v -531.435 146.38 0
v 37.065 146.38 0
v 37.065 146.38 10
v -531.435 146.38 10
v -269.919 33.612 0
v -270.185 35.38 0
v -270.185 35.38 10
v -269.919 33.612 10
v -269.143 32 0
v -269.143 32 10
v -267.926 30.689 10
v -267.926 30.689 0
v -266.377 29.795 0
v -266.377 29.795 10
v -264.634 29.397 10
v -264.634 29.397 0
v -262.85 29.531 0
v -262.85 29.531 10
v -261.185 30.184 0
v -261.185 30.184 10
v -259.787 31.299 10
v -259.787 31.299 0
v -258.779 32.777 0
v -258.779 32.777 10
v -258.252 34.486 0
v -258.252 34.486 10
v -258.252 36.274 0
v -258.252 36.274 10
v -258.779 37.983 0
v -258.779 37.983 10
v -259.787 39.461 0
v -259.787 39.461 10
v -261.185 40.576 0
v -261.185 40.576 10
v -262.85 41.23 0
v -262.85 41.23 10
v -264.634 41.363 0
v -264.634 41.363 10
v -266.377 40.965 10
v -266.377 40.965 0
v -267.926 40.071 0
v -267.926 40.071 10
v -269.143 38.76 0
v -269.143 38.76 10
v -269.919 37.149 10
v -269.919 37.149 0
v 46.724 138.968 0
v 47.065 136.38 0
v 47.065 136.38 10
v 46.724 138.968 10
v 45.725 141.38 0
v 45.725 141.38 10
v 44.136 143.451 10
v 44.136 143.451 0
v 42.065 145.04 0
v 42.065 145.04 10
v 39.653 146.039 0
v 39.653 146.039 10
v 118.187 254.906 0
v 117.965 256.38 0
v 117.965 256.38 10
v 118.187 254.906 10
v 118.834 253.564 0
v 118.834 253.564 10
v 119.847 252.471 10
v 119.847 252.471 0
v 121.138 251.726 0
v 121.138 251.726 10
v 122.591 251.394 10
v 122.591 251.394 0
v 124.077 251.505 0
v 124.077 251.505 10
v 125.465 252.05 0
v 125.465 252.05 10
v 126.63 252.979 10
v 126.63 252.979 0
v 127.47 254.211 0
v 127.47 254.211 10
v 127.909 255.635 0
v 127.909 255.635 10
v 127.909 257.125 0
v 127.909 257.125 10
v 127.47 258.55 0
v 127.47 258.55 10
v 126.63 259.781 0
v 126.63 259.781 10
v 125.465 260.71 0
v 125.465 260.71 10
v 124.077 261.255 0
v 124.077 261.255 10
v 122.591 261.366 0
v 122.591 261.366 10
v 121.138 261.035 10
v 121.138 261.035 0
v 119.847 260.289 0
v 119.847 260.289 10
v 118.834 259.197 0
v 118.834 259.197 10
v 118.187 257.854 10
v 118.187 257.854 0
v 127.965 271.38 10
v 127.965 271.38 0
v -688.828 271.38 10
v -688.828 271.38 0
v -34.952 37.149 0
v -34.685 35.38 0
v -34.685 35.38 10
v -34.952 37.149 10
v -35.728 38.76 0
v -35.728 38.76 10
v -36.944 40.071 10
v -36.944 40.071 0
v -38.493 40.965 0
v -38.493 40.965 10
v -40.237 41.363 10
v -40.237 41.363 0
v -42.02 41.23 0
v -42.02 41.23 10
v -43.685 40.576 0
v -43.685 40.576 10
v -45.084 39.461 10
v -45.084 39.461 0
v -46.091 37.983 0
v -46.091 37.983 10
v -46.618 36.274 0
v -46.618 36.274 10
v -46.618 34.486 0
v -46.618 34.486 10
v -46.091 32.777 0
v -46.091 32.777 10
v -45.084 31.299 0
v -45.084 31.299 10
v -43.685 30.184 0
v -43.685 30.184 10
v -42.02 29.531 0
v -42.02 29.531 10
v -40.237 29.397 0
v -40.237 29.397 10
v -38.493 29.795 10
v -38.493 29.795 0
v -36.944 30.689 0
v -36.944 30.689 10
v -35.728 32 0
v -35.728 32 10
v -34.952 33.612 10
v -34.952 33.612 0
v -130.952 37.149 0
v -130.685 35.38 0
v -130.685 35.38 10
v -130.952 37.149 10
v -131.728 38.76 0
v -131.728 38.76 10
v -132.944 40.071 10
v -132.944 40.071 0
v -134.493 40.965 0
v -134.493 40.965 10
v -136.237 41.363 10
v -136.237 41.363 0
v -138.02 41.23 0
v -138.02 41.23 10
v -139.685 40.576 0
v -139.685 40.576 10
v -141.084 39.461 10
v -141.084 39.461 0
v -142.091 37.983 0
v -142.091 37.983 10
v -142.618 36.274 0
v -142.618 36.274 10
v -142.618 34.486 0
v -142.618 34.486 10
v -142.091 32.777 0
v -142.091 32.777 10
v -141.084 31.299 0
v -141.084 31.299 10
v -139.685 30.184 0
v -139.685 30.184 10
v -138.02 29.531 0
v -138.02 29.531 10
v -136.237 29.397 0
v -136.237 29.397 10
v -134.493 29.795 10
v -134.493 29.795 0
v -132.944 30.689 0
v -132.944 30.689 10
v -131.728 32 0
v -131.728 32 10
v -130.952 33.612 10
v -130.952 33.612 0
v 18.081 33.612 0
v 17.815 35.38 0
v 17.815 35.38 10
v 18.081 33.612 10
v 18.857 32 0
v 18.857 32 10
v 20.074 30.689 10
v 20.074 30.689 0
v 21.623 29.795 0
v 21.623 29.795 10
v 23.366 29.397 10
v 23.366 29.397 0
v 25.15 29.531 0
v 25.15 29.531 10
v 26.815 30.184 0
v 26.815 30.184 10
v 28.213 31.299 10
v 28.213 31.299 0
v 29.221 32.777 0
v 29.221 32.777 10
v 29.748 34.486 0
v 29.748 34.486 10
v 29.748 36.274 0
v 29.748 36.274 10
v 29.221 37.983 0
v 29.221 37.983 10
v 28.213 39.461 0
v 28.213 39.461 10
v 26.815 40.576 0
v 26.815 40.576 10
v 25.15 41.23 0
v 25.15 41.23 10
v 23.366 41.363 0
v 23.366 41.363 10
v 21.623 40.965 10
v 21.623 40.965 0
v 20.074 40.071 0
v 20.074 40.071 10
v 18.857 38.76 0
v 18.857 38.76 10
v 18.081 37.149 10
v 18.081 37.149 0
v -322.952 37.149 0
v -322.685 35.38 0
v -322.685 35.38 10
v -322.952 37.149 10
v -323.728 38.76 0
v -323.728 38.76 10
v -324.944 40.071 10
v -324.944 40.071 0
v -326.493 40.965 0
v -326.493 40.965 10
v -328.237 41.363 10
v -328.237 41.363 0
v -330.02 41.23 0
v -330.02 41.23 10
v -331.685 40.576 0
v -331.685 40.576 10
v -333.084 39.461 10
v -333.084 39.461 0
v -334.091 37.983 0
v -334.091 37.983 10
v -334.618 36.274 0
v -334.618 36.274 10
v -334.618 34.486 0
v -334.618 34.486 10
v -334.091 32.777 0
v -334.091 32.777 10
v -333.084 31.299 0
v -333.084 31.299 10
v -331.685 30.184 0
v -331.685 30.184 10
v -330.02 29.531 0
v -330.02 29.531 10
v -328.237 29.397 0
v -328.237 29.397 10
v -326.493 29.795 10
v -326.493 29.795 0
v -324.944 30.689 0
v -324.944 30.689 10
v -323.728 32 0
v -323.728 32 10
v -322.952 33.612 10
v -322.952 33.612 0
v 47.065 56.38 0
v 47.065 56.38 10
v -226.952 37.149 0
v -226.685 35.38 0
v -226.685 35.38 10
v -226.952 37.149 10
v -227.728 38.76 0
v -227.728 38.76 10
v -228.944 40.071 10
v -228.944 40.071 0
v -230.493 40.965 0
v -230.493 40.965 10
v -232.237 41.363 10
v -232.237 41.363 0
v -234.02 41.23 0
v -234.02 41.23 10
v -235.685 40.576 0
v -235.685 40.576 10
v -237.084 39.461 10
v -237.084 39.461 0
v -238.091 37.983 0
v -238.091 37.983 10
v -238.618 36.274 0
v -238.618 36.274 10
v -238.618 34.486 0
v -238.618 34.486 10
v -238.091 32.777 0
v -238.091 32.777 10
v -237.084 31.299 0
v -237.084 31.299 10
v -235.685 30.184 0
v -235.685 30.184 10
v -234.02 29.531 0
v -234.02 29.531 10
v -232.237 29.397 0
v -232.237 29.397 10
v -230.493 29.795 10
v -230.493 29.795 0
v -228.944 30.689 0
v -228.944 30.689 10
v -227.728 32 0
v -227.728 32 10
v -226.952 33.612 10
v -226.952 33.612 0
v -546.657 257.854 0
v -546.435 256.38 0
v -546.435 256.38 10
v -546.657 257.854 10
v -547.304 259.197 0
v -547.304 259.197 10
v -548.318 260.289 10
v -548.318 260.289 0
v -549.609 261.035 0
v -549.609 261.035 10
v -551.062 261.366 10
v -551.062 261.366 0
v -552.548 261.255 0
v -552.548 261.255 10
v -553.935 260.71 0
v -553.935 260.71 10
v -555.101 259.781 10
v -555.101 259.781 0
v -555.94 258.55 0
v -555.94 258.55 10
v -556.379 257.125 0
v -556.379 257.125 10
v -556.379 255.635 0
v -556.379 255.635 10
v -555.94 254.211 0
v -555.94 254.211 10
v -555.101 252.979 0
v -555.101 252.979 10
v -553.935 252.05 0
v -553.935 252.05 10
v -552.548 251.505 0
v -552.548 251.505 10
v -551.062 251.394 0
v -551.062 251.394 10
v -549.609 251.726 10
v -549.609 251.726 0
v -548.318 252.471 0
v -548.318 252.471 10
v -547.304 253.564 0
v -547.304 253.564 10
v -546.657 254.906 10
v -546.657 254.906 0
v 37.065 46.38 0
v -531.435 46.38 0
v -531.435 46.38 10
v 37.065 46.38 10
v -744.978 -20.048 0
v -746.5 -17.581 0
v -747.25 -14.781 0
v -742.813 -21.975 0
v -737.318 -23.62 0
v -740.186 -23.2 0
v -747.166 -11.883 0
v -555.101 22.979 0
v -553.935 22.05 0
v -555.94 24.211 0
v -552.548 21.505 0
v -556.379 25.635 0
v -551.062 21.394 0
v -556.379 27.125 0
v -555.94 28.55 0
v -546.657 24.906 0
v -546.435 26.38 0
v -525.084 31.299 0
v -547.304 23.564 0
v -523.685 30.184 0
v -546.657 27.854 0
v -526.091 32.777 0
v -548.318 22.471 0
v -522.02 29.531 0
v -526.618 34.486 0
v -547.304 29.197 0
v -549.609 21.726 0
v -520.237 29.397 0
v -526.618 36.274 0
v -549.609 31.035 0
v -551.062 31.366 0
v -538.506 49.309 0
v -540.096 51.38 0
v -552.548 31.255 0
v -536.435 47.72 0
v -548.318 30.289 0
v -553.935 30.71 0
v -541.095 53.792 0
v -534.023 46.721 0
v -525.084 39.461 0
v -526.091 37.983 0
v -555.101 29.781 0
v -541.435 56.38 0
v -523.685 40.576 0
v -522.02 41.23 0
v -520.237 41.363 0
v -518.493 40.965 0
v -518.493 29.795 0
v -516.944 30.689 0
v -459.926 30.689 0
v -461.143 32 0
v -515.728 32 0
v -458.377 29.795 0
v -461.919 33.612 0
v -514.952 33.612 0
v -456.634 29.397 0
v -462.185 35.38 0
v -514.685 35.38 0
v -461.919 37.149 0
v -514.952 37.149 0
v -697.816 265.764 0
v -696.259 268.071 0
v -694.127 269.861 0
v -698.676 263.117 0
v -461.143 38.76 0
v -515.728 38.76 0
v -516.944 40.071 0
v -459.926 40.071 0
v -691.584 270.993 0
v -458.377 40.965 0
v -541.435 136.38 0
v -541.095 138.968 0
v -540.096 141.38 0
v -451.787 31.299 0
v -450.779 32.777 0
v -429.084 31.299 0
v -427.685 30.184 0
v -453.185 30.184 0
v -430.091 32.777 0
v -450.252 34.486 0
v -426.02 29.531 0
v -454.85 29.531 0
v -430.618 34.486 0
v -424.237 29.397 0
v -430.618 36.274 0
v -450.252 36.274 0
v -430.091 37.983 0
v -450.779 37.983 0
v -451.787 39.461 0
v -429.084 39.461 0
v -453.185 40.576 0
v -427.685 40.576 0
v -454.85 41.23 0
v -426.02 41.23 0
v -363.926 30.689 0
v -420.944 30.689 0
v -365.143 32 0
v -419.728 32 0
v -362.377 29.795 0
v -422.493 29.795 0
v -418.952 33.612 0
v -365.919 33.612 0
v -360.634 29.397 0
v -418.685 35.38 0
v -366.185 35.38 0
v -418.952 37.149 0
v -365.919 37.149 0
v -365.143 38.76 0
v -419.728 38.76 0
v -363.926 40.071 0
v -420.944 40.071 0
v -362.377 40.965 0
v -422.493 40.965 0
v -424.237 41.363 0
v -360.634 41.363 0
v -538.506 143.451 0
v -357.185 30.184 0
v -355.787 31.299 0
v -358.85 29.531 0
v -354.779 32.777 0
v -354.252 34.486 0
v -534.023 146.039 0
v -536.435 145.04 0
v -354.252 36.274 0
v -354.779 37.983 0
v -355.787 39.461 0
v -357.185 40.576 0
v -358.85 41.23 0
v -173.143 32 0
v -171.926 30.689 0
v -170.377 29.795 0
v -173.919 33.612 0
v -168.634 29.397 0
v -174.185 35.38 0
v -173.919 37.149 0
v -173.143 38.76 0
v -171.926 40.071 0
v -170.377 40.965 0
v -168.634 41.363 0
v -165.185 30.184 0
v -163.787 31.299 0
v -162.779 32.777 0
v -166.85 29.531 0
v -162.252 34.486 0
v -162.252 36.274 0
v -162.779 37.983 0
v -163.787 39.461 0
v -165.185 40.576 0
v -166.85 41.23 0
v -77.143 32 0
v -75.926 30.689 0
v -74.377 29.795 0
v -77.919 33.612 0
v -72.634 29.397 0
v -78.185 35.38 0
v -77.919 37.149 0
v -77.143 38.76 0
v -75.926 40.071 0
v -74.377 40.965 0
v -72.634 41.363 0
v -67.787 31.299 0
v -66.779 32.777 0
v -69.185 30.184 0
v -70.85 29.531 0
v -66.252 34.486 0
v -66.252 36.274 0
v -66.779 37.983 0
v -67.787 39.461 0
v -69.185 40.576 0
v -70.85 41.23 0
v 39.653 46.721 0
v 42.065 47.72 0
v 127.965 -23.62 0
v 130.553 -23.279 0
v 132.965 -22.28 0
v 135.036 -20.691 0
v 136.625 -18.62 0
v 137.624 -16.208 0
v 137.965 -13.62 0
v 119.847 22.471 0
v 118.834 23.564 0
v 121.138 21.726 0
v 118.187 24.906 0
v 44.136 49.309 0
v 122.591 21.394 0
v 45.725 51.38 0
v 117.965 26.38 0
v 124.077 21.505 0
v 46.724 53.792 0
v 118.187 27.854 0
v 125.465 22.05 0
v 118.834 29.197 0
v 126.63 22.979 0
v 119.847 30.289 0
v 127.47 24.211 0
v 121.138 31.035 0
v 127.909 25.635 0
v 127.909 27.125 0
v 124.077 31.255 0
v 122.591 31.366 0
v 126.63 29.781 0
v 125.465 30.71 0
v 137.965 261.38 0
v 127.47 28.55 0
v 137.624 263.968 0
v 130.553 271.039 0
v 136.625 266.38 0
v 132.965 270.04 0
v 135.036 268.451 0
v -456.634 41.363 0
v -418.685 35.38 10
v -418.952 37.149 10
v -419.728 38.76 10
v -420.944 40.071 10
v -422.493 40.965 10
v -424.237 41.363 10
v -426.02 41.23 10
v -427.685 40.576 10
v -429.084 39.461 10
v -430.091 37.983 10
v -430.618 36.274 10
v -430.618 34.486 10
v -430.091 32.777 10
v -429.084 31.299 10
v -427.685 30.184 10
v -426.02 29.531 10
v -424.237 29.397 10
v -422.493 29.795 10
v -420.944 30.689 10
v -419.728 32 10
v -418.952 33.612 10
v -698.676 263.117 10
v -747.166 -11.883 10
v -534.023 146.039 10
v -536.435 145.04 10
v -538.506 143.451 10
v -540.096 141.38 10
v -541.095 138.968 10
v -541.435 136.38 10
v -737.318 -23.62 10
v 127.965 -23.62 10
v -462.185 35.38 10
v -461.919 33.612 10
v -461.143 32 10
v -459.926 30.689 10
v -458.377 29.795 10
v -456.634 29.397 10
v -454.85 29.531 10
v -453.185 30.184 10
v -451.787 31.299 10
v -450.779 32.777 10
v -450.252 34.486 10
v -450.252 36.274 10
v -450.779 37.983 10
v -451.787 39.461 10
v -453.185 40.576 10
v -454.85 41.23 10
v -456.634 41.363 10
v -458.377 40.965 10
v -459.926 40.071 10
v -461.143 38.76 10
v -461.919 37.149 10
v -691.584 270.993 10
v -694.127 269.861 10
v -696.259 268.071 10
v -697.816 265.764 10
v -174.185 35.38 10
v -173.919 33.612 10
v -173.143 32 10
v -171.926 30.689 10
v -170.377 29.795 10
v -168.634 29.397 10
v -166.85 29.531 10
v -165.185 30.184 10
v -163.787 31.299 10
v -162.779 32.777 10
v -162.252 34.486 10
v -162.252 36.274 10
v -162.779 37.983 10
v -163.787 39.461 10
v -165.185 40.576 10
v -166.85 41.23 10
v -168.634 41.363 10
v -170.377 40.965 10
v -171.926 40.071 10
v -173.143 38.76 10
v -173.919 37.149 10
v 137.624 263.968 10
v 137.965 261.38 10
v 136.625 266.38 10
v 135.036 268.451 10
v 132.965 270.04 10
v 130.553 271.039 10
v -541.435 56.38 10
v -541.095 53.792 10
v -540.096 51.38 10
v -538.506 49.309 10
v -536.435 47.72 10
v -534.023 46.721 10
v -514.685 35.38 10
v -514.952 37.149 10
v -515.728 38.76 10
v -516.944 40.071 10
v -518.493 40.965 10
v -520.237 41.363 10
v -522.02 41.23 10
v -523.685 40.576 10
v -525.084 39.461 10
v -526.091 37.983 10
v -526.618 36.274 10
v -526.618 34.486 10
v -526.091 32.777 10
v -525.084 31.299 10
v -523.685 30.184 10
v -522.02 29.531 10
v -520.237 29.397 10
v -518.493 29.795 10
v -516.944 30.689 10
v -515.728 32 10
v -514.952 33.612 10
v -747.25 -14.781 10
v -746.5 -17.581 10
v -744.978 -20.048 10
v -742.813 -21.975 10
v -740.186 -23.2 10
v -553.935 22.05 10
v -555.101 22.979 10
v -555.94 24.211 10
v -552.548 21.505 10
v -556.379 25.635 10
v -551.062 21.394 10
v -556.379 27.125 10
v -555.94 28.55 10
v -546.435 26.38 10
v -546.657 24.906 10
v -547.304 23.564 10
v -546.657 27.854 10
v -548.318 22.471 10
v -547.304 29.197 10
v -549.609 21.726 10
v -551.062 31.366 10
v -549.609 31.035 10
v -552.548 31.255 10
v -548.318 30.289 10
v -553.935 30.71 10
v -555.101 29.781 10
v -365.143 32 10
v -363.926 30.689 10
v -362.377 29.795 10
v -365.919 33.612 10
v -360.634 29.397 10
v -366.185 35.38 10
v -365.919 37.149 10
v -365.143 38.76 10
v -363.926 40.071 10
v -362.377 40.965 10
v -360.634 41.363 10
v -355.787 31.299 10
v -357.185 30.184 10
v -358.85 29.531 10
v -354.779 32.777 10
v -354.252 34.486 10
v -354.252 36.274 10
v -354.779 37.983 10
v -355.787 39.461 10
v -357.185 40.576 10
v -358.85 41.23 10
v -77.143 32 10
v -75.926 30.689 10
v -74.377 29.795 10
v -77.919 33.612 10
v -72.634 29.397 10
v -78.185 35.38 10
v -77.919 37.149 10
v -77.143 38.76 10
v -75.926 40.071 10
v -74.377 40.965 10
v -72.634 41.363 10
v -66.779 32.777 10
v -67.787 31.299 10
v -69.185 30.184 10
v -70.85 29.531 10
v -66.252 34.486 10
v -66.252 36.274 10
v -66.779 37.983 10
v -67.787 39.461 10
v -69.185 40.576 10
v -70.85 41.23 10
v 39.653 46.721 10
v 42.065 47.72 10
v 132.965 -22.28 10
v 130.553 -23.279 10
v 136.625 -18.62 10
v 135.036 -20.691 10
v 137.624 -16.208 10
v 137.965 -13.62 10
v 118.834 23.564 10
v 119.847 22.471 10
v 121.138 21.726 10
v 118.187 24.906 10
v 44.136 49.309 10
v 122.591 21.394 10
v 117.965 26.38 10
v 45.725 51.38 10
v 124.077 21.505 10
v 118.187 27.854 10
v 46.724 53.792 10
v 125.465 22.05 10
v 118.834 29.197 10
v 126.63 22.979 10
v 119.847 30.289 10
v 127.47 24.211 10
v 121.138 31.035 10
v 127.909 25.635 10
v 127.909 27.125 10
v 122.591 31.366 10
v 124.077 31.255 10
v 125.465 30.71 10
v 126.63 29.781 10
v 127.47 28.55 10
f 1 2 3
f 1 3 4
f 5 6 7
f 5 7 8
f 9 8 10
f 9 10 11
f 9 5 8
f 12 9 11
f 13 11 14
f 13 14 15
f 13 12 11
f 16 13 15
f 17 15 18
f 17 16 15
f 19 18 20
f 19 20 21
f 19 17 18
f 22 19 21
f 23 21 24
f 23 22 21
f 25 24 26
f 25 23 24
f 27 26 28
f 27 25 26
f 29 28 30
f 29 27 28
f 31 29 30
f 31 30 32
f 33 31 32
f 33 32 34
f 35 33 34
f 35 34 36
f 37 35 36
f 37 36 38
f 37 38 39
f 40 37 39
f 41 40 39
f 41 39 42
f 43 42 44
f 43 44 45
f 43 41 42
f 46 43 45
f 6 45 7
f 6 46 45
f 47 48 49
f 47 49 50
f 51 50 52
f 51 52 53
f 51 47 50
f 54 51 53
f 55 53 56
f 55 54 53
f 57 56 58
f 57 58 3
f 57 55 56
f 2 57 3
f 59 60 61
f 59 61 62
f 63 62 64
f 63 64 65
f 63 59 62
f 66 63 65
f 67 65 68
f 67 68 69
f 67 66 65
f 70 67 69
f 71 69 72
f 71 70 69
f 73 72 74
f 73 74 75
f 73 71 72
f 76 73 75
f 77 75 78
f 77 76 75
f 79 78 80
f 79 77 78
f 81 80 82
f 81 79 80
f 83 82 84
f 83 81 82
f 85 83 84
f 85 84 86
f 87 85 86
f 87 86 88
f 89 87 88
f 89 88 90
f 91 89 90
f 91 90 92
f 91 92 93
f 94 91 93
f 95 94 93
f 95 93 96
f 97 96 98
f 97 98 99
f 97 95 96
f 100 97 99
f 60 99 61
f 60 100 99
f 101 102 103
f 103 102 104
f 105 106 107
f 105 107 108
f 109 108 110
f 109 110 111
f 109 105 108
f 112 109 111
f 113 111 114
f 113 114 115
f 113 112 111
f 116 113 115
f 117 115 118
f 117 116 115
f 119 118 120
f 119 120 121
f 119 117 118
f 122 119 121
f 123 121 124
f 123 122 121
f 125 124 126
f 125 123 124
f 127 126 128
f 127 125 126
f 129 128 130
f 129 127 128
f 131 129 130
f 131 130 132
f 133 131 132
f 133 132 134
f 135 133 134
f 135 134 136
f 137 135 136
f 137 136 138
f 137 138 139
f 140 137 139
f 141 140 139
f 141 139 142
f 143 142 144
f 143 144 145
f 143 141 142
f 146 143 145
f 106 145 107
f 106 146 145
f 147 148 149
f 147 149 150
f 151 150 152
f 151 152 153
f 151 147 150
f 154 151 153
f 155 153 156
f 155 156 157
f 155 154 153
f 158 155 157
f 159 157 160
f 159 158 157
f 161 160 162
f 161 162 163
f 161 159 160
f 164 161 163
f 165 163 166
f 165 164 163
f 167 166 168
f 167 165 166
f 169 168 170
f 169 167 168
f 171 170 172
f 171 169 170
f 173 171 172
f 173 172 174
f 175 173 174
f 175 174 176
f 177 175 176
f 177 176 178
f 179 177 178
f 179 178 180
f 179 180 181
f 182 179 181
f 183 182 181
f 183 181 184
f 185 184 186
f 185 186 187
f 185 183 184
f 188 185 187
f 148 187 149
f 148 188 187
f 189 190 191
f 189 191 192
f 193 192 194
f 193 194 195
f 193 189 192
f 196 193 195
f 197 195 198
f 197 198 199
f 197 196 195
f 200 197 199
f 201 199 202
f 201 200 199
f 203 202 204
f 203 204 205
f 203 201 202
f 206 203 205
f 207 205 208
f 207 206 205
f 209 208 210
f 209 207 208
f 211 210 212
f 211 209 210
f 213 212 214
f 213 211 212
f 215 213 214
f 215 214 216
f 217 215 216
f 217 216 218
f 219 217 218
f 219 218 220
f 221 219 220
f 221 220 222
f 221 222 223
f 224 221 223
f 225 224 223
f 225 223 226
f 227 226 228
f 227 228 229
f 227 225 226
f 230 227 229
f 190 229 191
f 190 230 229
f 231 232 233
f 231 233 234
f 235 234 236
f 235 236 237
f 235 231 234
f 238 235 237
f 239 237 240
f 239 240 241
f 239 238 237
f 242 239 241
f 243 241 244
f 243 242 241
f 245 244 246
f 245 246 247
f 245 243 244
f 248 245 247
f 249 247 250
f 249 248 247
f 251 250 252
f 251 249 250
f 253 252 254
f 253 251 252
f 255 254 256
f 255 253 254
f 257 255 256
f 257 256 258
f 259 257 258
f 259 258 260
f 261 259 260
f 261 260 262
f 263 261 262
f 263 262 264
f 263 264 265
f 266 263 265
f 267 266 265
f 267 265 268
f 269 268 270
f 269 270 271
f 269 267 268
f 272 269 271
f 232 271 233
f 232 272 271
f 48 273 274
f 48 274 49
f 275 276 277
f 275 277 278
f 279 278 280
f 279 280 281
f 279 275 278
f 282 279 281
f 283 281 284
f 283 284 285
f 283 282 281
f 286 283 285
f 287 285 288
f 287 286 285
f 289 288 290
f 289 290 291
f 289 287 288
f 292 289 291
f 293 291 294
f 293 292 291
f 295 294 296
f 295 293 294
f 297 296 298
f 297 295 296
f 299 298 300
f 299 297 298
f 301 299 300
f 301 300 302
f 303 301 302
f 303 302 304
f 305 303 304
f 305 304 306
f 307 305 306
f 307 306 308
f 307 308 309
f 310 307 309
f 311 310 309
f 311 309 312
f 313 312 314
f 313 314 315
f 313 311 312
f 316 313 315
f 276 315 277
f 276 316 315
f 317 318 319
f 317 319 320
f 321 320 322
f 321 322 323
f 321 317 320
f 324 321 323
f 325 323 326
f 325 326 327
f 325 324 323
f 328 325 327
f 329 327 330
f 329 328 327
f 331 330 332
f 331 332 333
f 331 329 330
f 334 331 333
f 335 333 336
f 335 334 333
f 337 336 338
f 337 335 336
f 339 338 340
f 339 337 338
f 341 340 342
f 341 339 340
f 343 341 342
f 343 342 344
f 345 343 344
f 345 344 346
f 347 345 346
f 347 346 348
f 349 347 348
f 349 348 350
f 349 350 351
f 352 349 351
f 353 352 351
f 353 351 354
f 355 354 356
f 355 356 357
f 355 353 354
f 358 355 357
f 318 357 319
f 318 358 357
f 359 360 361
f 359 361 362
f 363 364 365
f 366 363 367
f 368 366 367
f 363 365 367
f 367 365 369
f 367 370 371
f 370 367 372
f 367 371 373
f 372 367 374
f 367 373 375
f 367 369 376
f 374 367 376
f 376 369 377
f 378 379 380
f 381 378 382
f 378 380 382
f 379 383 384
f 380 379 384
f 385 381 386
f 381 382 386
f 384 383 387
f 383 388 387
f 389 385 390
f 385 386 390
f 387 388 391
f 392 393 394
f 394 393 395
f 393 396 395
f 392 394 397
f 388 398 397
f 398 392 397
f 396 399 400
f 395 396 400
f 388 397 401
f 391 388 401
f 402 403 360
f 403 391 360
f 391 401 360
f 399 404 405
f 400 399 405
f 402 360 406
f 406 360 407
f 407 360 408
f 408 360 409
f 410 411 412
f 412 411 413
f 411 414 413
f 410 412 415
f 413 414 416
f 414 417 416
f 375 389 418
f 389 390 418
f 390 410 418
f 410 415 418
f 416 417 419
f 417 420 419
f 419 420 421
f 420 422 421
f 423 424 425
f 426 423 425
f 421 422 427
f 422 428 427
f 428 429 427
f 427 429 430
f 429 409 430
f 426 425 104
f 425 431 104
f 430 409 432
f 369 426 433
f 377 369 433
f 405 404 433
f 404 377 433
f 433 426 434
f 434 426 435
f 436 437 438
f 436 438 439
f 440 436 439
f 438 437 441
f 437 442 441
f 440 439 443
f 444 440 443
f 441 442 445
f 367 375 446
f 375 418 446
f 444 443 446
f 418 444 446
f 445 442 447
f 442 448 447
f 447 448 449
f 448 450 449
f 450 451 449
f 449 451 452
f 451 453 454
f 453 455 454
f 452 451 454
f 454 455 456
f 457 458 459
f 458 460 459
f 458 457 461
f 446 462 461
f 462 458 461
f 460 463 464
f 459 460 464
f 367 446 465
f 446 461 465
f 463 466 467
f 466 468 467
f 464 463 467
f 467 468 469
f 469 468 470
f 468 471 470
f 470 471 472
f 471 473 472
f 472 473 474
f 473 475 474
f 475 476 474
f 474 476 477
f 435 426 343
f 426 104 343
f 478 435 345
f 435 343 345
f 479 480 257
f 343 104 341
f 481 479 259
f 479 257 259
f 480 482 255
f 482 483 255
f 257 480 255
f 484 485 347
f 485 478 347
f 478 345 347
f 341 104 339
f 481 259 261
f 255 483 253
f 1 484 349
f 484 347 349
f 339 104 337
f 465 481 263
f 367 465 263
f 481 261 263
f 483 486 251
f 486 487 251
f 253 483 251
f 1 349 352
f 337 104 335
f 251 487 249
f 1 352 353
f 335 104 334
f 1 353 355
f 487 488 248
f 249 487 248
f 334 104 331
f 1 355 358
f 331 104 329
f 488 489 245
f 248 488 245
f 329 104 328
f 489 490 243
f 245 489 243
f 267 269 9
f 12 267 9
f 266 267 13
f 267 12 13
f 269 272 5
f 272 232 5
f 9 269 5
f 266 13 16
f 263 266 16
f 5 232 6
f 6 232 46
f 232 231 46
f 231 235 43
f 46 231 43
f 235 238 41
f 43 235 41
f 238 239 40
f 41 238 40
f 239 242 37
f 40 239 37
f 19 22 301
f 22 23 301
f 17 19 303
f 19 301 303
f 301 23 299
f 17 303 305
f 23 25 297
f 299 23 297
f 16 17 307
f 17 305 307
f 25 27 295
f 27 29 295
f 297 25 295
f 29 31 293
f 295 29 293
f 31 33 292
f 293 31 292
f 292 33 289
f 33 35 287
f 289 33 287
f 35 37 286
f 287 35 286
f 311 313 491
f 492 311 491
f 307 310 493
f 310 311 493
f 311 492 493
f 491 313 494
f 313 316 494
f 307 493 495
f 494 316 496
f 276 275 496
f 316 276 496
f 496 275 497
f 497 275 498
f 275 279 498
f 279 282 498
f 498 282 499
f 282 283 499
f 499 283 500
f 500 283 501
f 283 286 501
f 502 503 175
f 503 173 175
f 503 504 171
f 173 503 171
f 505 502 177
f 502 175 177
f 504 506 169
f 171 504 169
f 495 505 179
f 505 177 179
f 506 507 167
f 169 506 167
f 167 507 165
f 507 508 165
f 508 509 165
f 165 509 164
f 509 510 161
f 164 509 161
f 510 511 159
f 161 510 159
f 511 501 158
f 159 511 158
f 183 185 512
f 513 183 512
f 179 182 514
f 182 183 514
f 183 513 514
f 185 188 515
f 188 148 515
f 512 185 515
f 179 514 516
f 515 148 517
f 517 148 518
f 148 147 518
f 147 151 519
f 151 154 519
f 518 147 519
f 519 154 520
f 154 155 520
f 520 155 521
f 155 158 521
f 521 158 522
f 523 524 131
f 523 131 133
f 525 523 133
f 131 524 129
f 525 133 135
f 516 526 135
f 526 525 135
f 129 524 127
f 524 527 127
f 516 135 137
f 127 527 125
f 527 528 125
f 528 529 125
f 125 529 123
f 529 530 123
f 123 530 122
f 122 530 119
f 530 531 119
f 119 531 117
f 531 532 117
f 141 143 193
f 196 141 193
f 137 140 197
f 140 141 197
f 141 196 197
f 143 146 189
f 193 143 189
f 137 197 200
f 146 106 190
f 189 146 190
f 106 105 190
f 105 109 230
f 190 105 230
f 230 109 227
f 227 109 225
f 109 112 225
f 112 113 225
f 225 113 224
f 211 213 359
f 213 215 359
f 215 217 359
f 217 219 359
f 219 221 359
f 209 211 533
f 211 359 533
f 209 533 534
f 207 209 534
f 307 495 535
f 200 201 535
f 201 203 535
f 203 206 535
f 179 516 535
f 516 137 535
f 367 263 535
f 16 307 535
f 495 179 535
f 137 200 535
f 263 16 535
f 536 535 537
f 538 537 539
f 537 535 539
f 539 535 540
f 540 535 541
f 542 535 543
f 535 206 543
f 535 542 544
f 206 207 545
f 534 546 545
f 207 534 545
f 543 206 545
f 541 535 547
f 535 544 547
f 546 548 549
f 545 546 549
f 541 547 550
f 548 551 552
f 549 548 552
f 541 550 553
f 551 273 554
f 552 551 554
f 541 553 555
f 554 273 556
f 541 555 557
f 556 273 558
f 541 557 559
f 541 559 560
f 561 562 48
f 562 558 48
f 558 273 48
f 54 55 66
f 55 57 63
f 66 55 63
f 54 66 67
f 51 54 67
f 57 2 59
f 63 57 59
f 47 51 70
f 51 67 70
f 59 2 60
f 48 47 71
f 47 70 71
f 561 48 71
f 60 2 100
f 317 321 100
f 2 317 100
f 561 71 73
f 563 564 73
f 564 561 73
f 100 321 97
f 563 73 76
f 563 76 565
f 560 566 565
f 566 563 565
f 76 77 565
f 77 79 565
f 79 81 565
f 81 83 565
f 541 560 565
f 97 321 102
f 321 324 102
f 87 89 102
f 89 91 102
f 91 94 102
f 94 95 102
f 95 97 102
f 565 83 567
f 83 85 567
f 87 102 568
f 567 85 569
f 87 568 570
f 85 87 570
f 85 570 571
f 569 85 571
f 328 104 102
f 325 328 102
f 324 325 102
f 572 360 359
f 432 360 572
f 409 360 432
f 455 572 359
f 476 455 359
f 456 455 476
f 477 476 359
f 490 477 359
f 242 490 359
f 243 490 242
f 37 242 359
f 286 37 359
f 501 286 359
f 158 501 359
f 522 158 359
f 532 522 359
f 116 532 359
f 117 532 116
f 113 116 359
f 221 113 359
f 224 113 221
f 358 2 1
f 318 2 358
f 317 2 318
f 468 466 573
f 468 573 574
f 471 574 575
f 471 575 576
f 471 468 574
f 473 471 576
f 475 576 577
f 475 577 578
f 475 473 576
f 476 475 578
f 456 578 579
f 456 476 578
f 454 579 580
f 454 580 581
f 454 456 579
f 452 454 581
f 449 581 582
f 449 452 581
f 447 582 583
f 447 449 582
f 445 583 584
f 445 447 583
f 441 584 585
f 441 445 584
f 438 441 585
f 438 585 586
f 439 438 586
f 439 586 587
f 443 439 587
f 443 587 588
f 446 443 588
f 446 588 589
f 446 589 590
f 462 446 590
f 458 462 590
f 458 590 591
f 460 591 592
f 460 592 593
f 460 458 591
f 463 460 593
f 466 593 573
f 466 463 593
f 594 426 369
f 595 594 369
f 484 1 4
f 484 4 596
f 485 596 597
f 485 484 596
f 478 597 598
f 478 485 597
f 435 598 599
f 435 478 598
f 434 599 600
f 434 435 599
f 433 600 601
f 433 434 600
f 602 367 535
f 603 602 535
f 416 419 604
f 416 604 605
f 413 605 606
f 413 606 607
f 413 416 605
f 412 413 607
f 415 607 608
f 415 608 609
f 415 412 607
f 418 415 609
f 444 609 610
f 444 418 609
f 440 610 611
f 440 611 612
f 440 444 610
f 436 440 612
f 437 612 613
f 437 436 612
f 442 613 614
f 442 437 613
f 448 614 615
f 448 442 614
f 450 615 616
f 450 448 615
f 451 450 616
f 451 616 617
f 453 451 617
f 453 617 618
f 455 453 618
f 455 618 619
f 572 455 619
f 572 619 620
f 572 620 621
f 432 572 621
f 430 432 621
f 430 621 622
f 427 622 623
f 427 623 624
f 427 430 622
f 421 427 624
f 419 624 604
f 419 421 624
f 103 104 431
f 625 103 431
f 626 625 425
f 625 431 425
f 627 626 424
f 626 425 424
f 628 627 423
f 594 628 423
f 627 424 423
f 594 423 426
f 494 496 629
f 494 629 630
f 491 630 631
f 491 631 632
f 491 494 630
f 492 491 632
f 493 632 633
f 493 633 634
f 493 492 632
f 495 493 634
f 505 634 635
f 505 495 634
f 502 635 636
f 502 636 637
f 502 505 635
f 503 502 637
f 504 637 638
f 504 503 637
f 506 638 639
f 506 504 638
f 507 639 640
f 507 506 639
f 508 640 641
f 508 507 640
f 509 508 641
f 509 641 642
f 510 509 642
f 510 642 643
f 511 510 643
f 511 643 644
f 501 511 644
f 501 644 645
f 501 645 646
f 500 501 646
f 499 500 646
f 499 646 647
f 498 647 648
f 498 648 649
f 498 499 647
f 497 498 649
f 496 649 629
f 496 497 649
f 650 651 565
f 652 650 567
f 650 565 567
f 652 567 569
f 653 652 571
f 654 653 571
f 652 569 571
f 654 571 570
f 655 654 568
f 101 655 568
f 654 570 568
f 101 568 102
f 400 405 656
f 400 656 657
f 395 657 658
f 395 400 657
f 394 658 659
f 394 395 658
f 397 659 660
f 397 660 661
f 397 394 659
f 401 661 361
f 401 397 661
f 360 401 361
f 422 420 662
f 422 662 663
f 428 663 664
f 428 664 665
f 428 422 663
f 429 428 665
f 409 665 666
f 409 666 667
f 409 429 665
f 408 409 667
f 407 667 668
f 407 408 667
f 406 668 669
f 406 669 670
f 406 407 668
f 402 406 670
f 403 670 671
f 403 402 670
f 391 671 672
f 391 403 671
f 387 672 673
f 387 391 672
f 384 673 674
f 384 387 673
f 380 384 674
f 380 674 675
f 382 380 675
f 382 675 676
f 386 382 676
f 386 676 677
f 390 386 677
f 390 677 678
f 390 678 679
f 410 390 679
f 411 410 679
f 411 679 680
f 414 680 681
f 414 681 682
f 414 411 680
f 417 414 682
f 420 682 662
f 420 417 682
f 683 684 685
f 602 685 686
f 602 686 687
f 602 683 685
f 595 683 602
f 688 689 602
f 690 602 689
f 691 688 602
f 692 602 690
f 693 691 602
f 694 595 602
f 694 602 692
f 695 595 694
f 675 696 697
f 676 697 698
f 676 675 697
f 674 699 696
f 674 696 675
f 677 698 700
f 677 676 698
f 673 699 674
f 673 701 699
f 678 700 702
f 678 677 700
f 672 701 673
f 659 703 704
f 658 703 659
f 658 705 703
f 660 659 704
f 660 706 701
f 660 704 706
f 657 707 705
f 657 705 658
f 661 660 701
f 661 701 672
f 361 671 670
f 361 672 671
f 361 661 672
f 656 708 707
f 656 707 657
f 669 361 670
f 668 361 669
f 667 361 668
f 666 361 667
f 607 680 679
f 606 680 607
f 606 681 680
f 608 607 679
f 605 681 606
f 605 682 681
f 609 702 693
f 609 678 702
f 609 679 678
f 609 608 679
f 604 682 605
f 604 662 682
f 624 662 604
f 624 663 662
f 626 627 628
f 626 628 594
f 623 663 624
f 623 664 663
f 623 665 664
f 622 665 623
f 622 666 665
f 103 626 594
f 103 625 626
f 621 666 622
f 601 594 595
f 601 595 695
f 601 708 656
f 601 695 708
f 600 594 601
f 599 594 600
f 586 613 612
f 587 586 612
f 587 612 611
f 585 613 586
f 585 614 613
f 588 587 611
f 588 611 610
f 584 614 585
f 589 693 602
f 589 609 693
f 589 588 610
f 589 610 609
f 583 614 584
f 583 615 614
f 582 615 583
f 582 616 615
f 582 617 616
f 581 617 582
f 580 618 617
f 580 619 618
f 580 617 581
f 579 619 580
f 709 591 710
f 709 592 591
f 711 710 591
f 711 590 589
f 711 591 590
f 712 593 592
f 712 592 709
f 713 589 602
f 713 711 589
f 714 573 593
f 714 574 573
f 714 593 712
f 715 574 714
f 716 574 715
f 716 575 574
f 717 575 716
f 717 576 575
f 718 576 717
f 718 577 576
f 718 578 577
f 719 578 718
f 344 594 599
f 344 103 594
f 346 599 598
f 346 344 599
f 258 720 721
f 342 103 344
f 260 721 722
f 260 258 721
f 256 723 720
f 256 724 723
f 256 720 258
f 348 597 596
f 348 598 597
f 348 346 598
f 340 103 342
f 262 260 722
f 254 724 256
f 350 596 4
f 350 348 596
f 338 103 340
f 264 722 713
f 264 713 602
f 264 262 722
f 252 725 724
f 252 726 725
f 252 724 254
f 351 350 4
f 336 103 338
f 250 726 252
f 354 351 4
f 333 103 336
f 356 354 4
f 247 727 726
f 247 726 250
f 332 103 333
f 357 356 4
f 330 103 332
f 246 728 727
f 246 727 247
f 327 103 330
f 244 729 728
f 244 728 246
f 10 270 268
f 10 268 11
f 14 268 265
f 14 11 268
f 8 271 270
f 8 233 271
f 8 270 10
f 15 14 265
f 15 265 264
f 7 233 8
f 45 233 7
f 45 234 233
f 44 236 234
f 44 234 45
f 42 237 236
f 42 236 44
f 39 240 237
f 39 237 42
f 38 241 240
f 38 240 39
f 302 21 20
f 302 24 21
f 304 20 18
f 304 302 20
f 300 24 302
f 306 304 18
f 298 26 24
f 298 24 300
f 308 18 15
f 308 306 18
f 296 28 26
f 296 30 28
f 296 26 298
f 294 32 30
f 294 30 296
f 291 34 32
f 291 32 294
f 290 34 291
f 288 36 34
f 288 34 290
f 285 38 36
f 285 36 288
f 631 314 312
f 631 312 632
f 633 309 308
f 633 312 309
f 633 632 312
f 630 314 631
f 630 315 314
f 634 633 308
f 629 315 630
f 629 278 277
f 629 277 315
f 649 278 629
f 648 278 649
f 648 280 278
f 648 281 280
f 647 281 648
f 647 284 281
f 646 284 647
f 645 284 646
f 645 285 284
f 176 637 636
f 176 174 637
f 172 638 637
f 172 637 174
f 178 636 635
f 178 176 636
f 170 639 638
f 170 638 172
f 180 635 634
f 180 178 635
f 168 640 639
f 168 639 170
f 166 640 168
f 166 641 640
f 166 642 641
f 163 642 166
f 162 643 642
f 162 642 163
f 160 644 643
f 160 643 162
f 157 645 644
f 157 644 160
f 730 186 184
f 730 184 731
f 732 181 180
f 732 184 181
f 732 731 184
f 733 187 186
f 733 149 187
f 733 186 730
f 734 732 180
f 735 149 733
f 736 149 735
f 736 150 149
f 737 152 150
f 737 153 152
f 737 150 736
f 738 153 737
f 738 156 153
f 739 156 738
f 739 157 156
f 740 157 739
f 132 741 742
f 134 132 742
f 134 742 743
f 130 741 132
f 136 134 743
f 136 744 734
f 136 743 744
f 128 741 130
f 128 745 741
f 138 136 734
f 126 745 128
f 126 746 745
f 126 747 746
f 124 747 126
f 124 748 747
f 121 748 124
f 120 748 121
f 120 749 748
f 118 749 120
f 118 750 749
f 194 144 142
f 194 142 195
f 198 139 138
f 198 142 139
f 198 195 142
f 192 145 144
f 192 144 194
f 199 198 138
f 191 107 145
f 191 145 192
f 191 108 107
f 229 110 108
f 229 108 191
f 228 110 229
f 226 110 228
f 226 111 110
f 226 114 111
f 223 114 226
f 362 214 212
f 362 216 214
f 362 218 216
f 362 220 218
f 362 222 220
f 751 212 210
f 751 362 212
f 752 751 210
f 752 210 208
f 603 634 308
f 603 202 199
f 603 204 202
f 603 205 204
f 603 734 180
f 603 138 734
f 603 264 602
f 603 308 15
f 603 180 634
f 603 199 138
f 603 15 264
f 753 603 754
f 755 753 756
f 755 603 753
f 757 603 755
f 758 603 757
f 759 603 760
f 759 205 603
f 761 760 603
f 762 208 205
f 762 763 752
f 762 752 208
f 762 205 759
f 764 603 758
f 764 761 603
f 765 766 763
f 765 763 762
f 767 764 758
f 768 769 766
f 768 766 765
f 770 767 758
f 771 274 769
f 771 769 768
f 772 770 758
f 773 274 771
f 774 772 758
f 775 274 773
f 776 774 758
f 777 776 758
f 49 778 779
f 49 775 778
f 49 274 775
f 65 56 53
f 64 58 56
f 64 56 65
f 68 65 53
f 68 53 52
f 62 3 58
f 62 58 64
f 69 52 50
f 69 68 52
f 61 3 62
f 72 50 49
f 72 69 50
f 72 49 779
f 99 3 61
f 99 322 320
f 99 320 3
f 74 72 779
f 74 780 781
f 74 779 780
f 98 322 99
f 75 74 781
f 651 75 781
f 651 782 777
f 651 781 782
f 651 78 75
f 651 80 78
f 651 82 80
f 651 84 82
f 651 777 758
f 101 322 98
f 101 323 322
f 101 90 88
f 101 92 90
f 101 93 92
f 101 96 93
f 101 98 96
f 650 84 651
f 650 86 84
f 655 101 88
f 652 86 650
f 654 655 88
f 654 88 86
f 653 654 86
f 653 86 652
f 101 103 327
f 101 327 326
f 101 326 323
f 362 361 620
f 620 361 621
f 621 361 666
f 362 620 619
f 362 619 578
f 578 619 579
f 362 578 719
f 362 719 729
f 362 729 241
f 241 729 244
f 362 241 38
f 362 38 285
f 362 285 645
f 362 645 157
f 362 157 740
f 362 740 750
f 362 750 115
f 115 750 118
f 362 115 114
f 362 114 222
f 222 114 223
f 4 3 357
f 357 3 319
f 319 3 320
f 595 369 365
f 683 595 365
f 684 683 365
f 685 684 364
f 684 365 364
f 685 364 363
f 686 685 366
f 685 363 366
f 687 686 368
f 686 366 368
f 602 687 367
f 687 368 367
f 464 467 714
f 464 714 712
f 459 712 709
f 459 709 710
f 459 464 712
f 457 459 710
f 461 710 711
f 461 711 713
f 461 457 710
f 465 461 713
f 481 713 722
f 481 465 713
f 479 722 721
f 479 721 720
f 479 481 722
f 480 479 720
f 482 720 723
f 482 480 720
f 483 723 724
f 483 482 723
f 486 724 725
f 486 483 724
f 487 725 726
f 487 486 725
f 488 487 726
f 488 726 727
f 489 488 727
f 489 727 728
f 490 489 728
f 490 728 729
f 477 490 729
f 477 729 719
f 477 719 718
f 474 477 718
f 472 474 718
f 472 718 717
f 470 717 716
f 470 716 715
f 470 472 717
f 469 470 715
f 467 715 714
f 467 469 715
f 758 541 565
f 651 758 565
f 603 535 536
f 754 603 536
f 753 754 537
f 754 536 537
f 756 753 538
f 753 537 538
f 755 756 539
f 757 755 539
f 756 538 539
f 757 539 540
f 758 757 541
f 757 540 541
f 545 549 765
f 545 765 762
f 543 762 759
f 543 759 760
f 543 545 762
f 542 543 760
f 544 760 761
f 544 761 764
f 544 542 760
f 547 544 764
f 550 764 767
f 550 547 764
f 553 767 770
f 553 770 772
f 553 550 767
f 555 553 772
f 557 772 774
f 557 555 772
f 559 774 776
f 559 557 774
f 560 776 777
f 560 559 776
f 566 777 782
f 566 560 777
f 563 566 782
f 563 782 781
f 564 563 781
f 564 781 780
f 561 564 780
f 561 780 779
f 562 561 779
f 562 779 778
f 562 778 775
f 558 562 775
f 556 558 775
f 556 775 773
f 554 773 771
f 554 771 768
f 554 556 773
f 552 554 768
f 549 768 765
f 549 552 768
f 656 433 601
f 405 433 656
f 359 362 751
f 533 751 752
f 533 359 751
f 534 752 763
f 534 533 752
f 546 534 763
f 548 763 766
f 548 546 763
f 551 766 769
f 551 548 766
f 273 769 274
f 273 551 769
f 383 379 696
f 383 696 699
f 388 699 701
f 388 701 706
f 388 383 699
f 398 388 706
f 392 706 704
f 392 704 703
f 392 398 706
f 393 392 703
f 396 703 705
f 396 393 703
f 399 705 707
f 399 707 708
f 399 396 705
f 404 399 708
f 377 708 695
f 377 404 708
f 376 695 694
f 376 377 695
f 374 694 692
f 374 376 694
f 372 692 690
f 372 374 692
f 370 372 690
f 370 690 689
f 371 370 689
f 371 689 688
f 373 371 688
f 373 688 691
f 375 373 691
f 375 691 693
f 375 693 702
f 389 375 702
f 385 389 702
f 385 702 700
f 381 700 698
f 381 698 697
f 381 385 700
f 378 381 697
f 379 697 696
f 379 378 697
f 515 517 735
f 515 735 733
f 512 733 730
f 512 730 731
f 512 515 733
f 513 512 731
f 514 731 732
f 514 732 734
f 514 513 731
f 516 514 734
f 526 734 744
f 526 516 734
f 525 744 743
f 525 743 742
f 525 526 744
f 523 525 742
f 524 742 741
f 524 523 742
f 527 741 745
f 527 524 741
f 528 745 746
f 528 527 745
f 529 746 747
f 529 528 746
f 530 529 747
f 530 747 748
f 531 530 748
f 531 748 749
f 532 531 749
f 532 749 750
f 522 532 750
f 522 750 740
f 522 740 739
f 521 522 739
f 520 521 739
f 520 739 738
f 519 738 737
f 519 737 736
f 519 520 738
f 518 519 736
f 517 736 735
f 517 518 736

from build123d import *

# Parameters (mm, degrees)
SKETCH2_R           = 5
SKETCH2_R_2         = 6
BOSS_EXTRUDE1_DEPTH = 10


with BuildPart() as part:
    # Sketch2 → Boss-Extrude1 (new body)
    with BuildSketch(Plane.XY):
        with BuildLine():
            Line((-737.317762878, -23.619861577), (127.964701196, -23.619861577))
            ThreePointArc((127.964701196, -23.619861577), (135.035769008, -20.690929389), (137.964701196, -13.619861577))
            Line((137.964701196, -13.619861577), (137.964701196, 261.380138423))
            ThreePointArc((137.964701196, 261.380138423), (135.035769008, 268.451206235), (127.964701196, 271.380138423))
            Line((127.964701196, 271.380138423), (-688.827843183, 271.380138423))
            ThreePointArc((-688.827843183, 271.380138423), (-695.25571928, 269.040582854), (-698.675920713, 263.116620199))
            Line((-698.675920713, 263.116620199), (-747.165840408, -11.883379801))
            ThreePointArc((-747.165840408, -11.883379801), (-744.978207309, -20.047737674), (-737.317762878, -23.619861577))
        make_face()
        with Locations(Location((122.964701196, 256.380138423, 0), (0, 0, 180))):
            Circle(SKETCH2_R, mode=Mode.SUBTRACT)
        with Locations((-520.685298804, 35.380138423)):
            Circle(SKETCH2_R_2, mode=Mode.SUBTRACT)
        with Locations(Location((122.964701196, 26.380138423, 0), (0, 0, 180))):
            Circle(SKETCH2_R, mode=Mode.SUBTRACT)
        with Locations((-551.435298804, 256.380138423)):
            Circle(SKETCH2_R, mode=Mode.SUBTRACT)
        with Locations(Location((-456.185298804, 35.380138423, 0), (0, 0, 180))):
            Circle(SKETCH2_R_2, mode=Mode.SUBTRACT)
        with Locations((-424.685298804, 35.380138423)):
            Circle(SKETCH2_R_2, mode=Mode.SUBTRACT)
        with Locations(Location((-360.185298804, 35.380138423, 0), (0, 0, 180))):
            Circle(SKETCH2_R_2, mode=Mode.SUBTRACT)
        with Locations((-328.685298804, 35.380138423)):
            Circle(SKETCH2_R_2, mode=Mode.SUBTRACT)
        with Locations(Location((-264.185298804, 35.380138423, 0), (0, 0, 180))):
            Circle(SKETCH2_R_2, mode=Mode.SUBTRACT)
        with Locations((-232.685298804, 35.380138423)):
            Circle(SKETCH2_R_2, mode=Mode.SUBTRACT)
        with Locations(Location((-168.185298804, 35.380138423, 0), (0, 0, 180))):
            Circle(SKETCH2_R_2, mode=Mode.SUBTRACT)
        with Locations((-136.685298804, 35.380138423)):
            Circle(SKETCH2_R_2, mode=Mode.SUBTRACT)
        with Locations(Location((-72.185298804, 35.380138423, 0), (0, 0, 180))):
            Circle(SKETCH2_R_2, mode=Mode.SUBTRACT)
        with Locations((-551.435298804, 26.380138423)):
            Circle(SKETCH2_R, mode=Mode.SUBTRACT)
        with Locations((-40.685298804, 35.380138423)):
            Circle(SKETCH2_R_2, mode=Mode.SUBTRACT)
        with Locations(Location((23.814701196, 35.380138423, 0), (0, 0, 180))):
            Circle(SKETCH2_R_2, mode=Mode.SUBTRACT)
        with BuildLine():
            Line((-531.435298804, 46.380138423), (37.064561069, 46.380138423))
            ThreePointArc((37.064561069, 46.380138423), (44.135628881, 49.309070611), (47.064561069, 56.380138423))
            Line((47.064561069, 56.380138423), (47.064561069, 136.380138423))
            ThreePointArc((47.064561069, 136.380138423), (44.135628881, 143.451206235), (37.064561069, 146.380138423))
            Line((37.064561069, 146.380138423), (-531.435298804, 146.380138423))
            ThreePointArc((-531.435298804, 146.380138423), (-538.506366616, 143.451206235), (-541.435298804, 136.380138423))
            Line((-541.435298804, 136.380138423), (-541.435298804, 56.380138423))
            ThreePointArc((-541.435298804, 56.380138423), (-538.506366616, 49.309070611), (-531.435298804, 46.380138423))
        make_face(mode=Mode.SUBTRACT)
    extrude(amount=BOSS_EXTRUDE1_DEPTH)


solid = part.part
